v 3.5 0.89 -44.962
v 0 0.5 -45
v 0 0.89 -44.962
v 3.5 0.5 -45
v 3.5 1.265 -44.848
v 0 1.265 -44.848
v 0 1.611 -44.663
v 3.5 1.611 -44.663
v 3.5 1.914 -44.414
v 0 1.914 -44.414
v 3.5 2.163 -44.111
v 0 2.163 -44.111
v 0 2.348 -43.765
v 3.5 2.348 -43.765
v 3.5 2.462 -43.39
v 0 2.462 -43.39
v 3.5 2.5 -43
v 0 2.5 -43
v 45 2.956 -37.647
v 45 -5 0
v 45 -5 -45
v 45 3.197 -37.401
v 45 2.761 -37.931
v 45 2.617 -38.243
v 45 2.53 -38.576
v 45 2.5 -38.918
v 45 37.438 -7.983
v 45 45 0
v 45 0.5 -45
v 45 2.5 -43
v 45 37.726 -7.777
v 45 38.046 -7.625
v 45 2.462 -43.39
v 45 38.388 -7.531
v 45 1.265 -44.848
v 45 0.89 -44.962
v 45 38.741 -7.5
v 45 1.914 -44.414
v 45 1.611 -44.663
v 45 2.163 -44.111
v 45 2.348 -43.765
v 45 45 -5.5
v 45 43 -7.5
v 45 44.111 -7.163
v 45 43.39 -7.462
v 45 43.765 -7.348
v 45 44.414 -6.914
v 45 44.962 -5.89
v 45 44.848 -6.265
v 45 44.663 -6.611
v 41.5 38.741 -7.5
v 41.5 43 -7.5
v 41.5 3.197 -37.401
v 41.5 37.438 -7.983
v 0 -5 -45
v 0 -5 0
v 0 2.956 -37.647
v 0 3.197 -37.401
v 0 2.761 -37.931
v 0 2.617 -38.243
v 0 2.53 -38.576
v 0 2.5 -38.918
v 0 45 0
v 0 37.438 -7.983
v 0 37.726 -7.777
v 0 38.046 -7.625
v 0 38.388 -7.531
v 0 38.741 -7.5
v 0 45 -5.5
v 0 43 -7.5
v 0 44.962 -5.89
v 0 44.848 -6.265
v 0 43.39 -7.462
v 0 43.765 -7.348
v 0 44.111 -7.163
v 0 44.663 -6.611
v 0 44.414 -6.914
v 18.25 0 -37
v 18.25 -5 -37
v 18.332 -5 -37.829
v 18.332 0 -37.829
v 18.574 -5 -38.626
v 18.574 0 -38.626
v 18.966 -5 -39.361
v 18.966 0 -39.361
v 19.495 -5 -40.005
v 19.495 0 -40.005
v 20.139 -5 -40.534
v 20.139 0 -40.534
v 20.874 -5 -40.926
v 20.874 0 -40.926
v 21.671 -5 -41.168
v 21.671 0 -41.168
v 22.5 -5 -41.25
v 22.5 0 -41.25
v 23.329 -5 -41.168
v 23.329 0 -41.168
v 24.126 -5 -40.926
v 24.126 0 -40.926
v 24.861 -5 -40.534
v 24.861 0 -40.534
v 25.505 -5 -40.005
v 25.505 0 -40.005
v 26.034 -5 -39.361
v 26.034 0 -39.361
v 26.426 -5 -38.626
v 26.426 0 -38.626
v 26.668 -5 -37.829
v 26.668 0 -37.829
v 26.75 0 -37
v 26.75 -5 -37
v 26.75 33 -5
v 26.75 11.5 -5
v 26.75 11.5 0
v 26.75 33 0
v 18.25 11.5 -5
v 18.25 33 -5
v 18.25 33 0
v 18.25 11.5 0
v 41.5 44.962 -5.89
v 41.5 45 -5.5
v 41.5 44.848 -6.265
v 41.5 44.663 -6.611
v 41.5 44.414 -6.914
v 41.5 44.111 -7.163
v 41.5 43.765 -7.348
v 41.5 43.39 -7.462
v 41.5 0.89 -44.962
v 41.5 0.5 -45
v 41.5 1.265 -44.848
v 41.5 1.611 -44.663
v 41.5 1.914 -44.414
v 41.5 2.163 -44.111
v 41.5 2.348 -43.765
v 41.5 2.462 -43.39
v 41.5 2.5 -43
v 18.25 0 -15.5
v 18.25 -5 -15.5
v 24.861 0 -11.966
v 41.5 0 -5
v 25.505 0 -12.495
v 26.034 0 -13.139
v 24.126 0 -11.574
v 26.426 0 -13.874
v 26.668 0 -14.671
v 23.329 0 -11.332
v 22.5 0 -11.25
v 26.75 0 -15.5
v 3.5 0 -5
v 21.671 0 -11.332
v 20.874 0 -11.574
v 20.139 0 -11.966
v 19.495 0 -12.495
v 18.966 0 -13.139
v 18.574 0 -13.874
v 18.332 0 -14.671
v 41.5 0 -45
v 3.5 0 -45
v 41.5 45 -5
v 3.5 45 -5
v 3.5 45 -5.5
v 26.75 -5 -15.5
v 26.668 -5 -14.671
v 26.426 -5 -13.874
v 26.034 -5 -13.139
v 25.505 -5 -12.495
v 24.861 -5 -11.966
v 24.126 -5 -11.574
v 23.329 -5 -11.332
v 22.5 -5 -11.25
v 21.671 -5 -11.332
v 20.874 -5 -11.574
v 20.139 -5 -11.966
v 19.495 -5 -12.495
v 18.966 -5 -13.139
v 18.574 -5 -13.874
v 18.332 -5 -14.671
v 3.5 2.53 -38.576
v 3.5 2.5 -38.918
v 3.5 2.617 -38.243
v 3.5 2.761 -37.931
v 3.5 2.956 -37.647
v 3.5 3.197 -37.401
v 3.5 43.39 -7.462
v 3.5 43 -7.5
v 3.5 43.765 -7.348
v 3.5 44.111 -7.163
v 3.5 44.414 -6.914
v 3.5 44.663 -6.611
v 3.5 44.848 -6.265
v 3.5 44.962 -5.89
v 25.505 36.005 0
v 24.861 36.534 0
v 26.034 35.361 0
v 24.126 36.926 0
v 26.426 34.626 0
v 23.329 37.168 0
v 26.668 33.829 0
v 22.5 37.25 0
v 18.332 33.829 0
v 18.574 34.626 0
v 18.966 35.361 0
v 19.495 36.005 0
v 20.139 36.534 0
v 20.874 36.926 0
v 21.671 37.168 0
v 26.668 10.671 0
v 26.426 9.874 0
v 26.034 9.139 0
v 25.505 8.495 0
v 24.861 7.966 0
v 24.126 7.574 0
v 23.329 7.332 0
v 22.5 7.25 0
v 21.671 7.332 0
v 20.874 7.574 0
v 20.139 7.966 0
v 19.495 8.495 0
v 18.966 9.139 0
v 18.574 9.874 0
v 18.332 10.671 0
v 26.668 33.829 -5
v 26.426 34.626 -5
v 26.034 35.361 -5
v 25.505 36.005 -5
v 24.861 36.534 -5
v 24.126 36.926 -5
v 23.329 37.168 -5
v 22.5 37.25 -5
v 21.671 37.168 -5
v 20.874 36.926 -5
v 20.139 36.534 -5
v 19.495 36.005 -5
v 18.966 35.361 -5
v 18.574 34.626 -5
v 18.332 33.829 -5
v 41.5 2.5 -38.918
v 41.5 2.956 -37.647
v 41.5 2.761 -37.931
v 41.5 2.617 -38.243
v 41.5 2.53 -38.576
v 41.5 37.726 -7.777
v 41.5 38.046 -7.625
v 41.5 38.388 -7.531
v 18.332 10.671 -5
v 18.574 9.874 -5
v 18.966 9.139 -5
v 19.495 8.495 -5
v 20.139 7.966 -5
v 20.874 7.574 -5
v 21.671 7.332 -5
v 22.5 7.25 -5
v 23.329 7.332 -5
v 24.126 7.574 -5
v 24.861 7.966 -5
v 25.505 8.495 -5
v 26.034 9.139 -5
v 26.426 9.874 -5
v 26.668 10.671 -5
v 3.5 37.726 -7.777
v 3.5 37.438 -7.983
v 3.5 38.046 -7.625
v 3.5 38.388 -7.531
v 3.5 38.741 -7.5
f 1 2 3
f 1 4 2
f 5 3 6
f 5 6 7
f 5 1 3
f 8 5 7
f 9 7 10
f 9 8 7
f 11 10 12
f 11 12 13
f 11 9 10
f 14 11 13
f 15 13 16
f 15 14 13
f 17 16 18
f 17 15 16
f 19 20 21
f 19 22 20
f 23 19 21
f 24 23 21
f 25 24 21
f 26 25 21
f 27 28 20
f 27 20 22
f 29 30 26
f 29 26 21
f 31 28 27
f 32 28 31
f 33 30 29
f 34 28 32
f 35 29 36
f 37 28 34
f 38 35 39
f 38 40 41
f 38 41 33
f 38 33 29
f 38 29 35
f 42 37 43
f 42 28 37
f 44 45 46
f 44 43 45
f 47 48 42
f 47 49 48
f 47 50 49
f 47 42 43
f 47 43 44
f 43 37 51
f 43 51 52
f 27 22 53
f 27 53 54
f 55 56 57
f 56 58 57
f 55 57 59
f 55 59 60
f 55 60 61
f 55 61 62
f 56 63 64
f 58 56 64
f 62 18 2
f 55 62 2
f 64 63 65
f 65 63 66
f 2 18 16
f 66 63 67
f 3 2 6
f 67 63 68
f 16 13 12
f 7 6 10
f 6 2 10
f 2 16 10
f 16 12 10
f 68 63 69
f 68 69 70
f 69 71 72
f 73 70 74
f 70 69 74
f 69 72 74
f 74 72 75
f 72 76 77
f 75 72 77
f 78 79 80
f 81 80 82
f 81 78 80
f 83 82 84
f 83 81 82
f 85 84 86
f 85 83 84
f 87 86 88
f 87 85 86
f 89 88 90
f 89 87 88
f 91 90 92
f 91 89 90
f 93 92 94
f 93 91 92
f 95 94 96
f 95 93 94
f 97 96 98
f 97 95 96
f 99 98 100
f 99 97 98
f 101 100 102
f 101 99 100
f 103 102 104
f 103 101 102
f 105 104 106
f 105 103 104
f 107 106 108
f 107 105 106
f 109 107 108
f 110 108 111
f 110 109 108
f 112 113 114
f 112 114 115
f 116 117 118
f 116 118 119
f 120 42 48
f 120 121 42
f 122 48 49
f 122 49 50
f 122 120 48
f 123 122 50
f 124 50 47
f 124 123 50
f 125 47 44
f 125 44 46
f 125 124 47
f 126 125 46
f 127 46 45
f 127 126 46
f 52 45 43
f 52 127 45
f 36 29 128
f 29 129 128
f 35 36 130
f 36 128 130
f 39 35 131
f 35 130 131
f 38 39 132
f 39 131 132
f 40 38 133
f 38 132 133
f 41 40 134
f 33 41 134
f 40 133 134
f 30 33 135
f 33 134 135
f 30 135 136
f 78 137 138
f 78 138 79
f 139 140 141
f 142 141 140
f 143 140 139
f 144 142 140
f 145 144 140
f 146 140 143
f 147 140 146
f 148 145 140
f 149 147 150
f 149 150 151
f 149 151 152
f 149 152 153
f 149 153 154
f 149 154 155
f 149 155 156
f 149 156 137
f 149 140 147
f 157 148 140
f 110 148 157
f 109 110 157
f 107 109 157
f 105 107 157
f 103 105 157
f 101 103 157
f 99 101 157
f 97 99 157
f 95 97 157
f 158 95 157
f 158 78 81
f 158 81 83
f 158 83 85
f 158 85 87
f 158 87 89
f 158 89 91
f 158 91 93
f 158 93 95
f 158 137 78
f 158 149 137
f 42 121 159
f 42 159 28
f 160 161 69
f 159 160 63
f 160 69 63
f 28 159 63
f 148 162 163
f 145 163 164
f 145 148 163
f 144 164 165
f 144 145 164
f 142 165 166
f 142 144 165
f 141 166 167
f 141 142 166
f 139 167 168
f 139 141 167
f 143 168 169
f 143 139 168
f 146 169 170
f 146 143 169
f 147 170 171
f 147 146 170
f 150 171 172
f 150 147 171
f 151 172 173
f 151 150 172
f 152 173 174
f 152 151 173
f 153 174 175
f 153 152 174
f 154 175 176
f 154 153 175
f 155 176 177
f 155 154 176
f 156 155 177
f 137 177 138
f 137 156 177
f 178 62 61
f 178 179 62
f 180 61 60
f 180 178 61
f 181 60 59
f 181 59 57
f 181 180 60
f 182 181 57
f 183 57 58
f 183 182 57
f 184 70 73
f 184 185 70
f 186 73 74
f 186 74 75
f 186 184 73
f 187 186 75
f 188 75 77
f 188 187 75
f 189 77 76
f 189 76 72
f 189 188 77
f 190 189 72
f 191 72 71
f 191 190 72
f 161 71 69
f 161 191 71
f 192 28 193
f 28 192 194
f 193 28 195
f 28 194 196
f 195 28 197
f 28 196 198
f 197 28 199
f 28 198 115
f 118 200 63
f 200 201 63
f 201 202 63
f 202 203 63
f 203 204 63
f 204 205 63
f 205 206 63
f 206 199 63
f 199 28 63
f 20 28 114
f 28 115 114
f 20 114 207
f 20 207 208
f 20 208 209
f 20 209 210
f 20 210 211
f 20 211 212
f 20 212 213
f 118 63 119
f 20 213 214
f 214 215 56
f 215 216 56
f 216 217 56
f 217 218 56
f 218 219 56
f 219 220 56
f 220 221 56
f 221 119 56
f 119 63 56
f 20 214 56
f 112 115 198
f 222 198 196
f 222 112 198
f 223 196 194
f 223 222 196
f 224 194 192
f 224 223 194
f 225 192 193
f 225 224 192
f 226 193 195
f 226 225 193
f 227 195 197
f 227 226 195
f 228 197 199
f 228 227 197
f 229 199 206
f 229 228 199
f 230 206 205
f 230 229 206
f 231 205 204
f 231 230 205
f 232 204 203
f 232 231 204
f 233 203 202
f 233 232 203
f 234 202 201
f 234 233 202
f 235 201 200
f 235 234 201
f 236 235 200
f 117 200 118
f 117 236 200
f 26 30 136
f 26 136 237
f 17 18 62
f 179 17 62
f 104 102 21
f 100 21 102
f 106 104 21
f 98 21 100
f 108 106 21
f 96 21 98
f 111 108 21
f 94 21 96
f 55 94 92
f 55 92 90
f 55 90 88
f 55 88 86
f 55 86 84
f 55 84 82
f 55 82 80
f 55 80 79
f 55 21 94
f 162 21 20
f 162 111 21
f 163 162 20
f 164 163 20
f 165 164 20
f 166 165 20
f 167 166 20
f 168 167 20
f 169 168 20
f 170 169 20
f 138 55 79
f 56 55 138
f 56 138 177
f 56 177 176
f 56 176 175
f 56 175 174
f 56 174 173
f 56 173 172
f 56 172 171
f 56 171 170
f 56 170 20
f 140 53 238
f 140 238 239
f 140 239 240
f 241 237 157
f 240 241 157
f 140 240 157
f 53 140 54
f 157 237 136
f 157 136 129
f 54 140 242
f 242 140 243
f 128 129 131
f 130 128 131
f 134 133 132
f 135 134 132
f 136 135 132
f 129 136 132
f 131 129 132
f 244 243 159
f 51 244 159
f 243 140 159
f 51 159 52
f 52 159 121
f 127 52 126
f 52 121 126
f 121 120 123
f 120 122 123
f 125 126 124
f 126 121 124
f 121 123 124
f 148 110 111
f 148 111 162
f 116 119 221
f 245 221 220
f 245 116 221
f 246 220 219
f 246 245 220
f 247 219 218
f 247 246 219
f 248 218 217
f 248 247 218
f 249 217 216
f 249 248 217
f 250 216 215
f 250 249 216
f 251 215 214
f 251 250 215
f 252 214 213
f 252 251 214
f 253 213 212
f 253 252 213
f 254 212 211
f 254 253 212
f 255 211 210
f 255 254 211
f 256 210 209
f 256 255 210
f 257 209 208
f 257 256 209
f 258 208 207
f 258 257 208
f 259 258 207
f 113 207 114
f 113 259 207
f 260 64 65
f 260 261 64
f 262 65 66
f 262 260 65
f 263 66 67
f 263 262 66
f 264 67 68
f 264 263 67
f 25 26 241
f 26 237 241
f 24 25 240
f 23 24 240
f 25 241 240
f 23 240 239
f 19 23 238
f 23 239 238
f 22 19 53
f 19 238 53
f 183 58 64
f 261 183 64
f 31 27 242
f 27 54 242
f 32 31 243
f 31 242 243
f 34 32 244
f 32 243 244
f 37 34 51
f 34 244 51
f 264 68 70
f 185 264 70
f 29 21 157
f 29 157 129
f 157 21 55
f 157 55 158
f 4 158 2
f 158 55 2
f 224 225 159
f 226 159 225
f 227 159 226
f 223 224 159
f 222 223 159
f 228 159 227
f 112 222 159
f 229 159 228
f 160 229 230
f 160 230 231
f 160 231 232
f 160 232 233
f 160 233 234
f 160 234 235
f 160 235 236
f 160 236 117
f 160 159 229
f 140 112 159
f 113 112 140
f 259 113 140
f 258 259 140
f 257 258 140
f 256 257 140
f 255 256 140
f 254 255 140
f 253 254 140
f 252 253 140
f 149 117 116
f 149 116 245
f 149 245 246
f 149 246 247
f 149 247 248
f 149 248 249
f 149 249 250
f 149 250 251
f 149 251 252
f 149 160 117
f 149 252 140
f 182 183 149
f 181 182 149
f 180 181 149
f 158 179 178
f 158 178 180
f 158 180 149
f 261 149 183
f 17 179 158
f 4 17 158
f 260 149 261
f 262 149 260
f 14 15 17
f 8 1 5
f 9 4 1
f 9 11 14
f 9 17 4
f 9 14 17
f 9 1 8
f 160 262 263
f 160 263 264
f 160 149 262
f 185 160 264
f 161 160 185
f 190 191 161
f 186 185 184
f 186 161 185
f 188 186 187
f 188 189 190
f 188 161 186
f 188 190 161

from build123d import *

# Parameters (mm, degrees)
EXTRUDE_1_DEPTH     = 45
EXTRUDE_2_DEPTH     = 3.5
CUT_EXTRUDE_1_REACH = 77.166
CUT_EXTRUDE_2_REACH = 79.942
FILLET_1_R          = 2


with BuildPart() as part:
    # 草图1 → 凸台-拉伸1 (new body)
    with BuildSketch(Plane(origin=(0, 0, 0), x_dir=(0, 0, -1), z_dir=(1, 0, 0))):
        Polygon((0, 0), (0, 45), (5, 45), (5, 0), (45, 0), (45, -5), (0, -5), align=None)
    extrude(amount=EXTRUDE_1_DEPTH)

    # 草图2 → 凸台-拉伸2 (add)
    with BuildSketch(Plane(origin=(45, 0, 0), x_dir=(0, 0, -1), z_dir=(1, 0, 0))):
        Polygon((45, 0), (45, 2.5), (38, 2.5), (7.5, 38), (7.5, 45), (5, 45), (5, 0), align=None)
    extrude_2 = extrude(amount=-EXTRUDE_2_DEPTH)

    # 镜向1: 凸台-拉伸2 across plane
    add(extrude_2.mirror(Plane(origin=(22.5, 0, 0), x_dir=(0, 0, 1), z_dir=(1, 0, 0))))

    # 草图4 → 切除-拉伸1 (cut, up to next)
    with BuildSketch(Plane(origin=(0, 0, -5), x_dir=(-1, 0, 0), z_dir=(0, 0, -1)), mode=Mode.PRIVATE) as cut_extrude_1_sk1:
        with BuildLine():
            Line((-18.25, 33), (-18.25, 11.5))
            ThreePointArc((-18.25, 11.5), (-22.5, 7.25), (-26.75, 11.5))
            Line((-26.75, 11.5), (-26.75, 33))
            ThreePointArc((-26.75, 33), (-22.5, 37.25), (-18.25, 33))
        make_face()
    cut_extrude_1_tool1 = extrude(cut_extrude_1_sk1.sketch, amount=-CUT_EXTRUDE_1_REACH, mode=Mode.PRIVATE) & part.part
    add(cut_extrude_1_tool1.solids().sort_by_distance((22.5, 22.25, -5))[0], mode=Mode.SUBTRACT)

    # 草图5 → 切除-拉伸2 (cut, up to next)
    with BuildSketch(Plane(origin=(0, 0, 0), x_dir=(1, 0, 0), z_dir=(0, 1, 0)), mode=Mode.PRIVATE) as cut_extrude_2_sk1:
        with BuildLine():
            Line((26.75, 37), (26.75, 15.5))
            ThreePointArc((26.75, 15.5), (22.5, 11.25), (18.25, 15.5))
            Line((18.25, 15.5), (18.25, 37))
            ThreePointArc((18.25, 37), (22.5, 41.25), (26.75, 37))
        make_face()
    cut_extrude_2_tool1 = extrude(cut_extrude_2_sk1.sketch, amount=-CUT_EXTRUDE_2_REACH, mode=Mode.PRIVATE) & part.part
    add(cut_extrude_2_tool1.solids().sort_by_distance((22.5, 0, -26.25))[0], mode=Mode.SUBTRACT)

    # 圆角1
    fillet_1_edges = [part.edges().sort_by_distance(p)[0] for p in [
        (43.25, 45, -7.5),
        (43.25, 38, -7.5),
        (43.25, 2.5, -38),
        (43.25, 2.5, -45),
        (1.75, 2.5, -45),
        (1.75, 2.5, -38),
        (1.75, 38, -7.5),
        (1.75, 45, -7.5),
    ]]
    fillet(fillet_1_edges, radius=FILLET_1_R)


solid = part.part
